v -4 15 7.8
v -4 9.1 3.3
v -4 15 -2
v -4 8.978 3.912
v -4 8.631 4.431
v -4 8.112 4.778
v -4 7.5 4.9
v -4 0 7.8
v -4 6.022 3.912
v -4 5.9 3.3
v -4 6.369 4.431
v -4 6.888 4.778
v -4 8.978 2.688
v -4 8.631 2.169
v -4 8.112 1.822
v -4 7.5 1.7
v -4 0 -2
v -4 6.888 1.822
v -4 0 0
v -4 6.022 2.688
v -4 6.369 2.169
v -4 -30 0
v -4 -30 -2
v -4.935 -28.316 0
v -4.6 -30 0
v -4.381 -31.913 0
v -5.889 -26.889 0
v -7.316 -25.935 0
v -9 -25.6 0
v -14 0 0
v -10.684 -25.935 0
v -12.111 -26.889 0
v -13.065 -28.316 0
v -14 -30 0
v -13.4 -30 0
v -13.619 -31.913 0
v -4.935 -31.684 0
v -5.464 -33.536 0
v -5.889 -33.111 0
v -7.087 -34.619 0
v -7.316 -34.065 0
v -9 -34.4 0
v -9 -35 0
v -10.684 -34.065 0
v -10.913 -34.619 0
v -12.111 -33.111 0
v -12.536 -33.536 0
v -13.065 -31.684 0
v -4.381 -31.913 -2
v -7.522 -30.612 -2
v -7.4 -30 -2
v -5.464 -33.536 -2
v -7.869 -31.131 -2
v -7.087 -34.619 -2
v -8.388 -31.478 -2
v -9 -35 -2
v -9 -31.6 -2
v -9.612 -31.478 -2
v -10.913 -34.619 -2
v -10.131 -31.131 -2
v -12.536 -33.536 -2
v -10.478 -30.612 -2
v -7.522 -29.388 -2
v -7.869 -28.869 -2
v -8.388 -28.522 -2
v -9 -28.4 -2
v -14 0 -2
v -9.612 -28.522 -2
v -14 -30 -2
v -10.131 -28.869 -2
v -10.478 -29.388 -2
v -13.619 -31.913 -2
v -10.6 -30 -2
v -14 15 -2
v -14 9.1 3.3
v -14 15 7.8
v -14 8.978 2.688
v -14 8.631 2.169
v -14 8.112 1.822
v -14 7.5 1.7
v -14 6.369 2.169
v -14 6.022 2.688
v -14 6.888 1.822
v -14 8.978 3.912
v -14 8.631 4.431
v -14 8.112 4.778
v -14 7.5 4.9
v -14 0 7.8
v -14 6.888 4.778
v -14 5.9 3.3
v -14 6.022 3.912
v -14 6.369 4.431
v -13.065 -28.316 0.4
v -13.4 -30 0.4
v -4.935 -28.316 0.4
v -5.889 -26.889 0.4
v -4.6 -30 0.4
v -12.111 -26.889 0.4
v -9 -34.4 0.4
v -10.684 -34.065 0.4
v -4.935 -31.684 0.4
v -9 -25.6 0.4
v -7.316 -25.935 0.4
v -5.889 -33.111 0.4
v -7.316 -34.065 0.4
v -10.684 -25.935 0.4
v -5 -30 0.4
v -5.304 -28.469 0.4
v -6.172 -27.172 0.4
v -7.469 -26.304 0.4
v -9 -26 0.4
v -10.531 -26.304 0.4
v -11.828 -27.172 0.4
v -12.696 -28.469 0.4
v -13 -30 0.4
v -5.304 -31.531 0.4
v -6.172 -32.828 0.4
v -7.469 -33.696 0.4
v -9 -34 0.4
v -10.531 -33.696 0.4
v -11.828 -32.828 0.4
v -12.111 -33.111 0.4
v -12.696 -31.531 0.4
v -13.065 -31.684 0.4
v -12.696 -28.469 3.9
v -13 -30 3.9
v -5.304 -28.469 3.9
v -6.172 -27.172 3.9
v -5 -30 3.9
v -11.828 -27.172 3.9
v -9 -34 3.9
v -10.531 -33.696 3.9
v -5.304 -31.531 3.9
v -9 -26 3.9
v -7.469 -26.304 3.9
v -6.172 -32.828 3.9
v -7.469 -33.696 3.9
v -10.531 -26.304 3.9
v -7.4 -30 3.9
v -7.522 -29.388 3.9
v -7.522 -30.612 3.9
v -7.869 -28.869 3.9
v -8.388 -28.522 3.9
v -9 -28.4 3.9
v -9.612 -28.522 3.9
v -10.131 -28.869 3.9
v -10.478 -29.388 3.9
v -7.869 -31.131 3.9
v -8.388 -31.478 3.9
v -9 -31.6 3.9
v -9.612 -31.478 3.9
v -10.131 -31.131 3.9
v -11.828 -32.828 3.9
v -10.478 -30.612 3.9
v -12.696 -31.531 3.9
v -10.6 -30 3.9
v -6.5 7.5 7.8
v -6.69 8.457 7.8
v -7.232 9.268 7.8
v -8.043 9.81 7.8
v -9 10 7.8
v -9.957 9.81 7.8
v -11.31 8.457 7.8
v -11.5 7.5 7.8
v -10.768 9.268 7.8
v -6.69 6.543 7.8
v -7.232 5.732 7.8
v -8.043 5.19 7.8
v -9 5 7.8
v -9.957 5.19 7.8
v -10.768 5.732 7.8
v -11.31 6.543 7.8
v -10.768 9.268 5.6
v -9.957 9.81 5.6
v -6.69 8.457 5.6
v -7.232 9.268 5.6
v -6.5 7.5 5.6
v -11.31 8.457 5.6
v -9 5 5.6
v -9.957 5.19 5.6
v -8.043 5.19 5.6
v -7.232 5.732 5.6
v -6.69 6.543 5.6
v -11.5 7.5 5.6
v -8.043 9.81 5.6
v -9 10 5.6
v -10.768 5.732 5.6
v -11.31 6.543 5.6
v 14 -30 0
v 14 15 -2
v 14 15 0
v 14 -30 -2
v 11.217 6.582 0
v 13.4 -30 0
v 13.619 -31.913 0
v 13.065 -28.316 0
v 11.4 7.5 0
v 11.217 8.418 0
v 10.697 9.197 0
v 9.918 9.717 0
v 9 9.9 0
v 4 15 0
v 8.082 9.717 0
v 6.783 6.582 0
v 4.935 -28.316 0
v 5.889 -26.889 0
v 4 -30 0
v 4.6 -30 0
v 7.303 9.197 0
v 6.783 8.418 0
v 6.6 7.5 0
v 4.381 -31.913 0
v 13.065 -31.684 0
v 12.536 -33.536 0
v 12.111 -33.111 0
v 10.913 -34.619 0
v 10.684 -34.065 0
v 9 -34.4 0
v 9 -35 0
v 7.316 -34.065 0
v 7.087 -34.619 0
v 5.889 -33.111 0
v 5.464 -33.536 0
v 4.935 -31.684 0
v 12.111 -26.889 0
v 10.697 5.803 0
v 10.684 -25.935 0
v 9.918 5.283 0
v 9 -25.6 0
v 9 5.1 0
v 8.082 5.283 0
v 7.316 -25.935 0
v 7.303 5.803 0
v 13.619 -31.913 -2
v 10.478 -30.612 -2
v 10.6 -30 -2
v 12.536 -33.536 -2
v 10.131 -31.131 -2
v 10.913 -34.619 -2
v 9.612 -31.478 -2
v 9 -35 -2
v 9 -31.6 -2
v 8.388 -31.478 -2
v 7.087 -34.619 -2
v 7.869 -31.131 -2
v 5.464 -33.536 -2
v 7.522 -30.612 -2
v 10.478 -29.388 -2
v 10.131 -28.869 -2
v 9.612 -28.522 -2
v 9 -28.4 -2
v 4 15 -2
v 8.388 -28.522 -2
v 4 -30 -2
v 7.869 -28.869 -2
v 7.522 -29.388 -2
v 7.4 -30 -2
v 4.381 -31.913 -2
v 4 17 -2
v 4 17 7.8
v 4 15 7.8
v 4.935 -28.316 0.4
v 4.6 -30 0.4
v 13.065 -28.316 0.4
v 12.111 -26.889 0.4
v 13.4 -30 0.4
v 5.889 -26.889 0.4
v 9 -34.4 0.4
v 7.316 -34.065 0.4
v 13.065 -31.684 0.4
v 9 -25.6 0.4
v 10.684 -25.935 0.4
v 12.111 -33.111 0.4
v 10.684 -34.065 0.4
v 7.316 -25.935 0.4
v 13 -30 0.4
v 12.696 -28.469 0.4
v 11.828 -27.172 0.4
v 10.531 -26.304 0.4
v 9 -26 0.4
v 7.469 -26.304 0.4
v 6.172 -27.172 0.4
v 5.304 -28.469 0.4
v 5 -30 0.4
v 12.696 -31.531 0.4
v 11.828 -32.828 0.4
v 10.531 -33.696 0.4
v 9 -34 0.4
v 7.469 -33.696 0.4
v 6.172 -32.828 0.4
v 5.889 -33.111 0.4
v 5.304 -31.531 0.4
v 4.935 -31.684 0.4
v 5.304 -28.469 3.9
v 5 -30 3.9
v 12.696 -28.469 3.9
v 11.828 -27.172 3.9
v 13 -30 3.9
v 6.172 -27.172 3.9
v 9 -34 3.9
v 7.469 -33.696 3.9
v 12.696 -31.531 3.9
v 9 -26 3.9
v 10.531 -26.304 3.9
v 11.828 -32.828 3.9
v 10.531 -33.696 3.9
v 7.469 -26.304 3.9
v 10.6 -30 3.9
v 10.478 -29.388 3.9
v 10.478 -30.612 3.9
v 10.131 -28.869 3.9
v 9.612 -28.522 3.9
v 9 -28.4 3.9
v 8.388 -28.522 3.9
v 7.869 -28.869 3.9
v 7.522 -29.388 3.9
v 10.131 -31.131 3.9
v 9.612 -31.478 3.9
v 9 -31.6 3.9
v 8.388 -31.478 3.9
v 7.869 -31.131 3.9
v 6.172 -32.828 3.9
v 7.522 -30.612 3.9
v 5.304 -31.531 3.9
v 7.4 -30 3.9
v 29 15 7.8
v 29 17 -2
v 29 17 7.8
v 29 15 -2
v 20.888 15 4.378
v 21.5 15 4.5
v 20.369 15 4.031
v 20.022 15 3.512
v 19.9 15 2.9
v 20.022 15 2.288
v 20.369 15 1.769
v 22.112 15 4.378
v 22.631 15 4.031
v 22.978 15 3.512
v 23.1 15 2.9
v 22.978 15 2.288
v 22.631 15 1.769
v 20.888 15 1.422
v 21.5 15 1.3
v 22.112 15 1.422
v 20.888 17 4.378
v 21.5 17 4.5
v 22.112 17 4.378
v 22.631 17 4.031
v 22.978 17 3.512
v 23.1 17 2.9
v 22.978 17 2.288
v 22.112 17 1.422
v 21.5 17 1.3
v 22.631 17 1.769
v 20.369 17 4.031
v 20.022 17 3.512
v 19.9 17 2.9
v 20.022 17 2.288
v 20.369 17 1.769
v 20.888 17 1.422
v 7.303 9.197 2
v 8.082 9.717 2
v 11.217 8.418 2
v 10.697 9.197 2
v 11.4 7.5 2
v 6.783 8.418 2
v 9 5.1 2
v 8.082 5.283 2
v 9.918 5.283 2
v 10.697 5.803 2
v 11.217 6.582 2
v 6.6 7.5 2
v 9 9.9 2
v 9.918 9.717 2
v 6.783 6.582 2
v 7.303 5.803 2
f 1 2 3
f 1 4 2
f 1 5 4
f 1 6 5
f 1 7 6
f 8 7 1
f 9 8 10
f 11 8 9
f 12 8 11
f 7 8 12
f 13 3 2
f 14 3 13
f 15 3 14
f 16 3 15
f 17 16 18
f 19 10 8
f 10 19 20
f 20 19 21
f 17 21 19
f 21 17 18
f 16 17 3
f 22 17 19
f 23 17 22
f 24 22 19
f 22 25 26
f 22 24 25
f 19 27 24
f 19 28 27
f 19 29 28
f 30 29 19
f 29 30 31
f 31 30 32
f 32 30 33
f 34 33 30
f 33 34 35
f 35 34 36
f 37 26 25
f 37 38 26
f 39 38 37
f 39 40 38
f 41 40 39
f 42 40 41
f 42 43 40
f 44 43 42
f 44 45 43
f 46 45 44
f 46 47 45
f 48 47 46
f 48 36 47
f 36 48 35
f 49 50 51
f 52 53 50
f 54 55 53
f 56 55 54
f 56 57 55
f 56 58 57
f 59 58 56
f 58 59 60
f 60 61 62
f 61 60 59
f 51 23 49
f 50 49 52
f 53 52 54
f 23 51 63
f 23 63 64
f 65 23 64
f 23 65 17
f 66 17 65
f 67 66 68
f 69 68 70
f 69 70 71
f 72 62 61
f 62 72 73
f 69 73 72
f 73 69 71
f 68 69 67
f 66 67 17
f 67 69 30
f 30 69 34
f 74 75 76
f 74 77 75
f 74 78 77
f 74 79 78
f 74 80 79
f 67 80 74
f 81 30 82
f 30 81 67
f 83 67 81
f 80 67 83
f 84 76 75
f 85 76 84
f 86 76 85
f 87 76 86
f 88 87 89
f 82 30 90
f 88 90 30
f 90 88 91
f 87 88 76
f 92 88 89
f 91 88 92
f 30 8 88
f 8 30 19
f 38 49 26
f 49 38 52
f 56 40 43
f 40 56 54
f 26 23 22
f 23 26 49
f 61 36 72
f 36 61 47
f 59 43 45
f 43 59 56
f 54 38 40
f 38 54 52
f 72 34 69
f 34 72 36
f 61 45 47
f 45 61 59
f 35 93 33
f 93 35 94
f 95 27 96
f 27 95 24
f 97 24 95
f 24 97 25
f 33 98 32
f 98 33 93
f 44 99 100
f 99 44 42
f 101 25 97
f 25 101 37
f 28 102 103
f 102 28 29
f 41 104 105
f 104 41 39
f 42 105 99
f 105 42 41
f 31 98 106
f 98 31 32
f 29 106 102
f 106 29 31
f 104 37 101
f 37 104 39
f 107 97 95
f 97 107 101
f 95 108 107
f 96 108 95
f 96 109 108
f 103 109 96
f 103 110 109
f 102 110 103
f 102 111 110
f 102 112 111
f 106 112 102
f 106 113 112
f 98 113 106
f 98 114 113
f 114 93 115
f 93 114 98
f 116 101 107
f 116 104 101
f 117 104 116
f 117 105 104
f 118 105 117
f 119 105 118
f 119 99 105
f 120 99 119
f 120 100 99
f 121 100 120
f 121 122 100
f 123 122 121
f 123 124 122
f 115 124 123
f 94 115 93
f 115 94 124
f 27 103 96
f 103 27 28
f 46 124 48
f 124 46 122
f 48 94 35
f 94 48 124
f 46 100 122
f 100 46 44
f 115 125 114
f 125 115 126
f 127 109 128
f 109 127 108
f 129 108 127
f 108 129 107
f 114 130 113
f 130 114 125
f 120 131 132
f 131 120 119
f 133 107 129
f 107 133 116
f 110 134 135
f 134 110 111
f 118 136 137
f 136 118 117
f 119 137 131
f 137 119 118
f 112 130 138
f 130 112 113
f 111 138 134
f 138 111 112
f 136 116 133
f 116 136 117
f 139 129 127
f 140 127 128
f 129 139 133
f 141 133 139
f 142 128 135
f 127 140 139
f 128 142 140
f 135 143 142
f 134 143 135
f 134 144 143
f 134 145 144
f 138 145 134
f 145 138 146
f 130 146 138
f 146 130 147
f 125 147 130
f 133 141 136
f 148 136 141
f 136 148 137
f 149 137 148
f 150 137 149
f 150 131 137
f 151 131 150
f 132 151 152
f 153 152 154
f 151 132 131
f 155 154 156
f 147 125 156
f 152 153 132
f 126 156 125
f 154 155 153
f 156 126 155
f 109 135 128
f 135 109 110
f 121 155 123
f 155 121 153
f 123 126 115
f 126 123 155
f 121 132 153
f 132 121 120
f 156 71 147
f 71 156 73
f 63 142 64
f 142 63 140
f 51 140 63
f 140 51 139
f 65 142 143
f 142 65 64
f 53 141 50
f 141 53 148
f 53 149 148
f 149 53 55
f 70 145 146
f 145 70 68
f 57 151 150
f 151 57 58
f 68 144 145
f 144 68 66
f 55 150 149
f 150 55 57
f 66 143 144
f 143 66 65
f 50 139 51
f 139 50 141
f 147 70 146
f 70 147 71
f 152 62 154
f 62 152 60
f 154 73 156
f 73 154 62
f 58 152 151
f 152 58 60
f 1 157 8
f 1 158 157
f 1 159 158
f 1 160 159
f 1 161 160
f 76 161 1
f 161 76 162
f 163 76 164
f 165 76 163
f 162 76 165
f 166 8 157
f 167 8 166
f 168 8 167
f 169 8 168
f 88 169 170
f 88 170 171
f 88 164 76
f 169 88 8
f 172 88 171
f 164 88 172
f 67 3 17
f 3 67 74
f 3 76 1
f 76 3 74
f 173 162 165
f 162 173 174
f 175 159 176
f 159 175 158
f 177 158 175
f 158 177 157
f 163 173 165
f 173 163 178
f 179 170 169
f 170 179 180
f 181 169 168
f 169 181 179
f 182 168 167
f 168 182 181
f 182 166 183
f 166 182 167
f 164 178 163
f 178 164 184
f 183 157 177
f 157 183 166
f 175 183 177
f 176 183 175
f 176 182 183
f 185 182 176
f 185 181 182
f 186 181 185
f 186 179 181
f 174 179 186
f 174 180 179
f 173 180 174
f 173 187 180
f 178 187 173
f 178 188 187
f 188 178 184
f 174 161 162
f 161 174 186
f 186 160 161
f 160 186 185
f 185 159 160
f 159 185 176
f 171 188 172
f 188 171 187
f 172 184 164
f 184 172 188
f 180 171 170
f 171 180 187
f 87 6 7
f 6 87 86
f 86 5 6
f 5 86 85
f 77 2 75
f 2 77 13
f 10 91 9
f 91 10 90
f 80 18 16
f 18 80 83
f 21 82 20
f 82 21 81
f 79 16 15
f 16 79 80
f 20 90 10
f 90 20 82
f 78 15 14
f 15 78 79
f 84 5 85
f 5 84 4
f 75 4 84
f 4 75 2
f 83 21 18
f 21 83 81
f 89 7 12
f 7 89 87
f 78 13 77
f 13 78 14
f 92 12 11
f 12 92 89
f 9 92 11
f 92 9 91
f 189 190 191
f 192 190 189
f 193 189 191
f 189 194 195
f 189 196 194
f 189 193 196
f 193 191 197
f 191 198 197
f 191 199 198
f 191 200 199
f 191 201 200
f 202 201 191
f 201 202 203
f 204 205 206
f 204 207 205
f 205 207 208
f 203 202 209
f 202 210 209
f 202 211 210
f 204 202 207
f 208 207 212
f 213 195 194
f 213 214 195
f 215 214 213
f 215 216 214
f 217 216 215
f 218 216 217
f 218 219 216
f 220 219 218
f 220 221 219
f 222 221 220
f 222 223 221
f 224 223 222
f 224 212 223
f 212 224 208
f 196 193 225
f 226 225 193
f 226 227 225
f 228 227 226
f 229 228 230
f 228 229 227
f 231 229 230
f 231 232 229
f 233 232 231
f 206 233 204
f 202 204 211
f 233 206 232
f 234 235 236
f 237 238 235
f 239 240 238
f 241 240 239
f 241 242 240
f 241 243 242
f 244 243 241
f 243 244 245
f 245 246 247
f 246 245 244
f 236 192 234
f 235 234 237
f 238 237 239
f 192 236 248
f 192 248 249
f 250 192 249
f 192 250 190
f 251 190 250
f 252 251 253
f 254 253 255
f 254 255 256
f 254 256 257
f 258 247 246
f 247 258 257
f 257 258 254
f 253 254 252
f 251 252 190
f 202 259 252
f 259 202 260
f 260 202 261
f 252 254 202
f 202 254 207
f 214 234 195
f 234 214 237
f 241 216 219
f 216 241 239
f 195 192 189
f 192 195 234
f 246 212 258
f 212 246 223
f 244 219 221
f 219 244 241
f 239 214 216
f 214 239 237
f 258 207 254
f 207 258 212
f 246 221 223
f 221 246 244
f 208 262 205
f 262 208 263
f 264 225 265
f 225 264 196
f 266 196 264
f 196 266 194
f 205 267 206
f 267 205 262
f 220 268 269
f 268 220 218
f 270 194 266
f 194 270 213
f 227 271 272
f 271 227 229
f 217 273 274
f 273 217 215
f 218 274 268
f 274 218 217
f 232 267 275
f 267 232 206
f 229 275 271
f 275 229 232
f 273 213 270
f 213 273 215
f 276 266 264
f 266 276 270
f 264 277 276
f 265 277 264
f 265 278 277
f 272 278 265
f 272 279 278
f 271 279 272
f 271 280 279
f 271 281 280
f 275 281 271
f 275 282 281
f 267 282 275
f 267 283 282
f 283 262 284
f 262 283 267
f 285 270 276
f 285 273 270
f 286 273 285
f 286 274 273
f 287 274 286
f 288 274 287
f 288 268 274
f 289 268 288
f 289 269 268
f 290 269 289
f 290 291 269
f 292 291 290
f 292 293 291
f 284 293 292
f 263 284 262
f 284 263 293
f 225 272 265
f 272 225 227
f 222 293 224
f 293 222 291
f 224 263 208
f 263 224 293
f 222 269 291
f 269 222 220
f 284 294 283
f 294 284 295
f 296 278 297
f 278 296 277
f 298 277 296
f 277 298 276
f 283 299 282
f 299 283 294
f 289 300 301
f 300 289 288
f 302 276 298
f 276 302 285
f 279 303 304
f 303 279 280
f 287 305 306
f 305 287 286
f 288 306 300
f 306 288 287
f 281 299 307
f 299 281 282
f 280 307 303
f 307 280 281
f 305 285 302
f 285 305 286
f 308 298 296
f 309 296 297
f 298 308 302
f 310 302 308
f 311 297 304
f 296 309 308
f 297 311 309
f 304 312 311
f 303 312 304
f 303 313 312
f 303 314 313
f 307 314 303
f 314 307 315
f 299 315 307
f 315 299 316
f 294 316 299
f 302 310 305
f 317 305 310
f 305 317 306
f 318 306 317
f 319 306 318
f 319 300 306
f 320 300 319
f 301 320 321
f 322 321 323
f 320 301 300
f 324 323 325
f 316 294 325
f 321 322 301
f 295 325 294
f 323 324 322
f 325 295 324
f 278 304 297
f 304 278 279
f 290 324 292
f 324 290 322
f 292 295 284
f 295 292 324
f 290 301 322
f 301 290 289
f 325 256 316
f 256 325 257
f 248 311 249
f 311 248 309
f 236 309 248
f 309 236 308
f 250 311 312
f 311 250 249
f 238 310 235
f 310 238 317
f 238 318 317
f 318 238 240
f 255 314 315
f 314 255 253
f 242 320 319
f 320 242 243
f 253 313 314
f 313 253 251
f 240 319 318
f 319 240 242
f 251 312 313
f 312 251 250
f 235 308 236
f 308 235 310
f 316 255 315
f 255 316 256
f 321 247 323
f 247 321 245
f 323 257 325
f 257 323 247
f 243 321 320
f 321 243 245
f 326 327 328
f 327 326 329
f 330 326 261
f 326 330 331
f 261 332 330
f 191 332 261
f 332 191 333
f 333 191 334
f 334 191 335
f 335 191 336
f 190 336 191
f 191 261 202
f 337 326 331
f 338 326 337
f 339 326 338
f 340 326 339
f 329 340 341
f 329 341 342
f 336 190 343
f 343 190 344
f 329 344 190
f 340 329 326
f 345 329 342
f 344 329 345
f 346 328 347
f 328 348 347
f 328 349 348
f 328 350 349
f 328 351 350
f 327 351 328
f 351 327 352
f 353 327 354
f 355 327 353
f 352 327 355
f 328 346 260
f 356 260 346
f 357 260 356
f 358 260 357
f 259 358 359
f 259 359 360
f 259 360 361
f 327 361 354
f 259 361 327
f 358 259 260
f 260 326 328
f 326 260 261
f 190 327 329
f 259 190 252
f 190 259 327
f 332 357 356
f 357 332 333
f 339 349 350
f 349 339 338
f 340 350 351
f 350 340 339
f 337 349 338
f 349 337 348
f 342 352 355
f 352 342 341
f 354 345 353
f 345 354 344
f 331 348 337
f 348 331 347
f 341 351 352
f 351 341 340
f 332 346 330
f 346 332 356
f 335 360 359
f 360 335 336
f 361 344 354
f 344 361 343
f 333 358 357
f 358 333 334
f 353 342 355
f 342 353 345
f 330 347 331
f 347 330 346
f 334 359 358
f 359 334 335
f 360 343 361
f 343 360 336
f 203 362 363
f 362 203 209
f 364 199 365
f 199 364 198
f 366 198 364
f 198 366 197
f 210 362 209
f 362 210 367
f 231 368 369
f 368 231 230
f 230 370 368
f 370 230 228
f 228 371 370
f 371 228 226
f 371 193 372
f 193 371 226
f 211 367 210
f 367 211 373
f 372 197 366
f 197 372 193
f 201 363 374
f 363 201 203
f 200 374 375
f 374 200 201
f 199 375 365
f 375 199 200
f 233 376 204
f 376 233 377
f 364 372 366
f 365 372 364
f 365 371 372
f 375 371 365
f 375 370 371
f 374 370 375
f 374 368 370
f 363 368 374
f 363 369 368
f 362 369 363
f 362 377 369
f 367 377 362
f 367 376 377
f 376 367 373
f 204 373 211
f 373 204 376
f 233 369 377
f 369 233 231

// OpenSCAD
$fn = 16;

openbeam_width = 15;
width = 10;
height = 30;
thickness = 2;
axle_dia = 8;
bearing_width = 7;
clip_dia = 5;
clip_height = 2;
screw_dia = 3+0.2;
bearing_spacer_height = 0.4;

module bracket1_bearing_arm() {
	difference() {
		union() {
			translate([0, 0, -thickness/2])
				union() {
					cube([width, height, thickness], center = true);
					translate([0, -height/2, 0])
						cylinder(d = width, h = thickness, center = true);
				}

			translate([0, -height/2, 0]) {
				cylinder(d = axle_dia*1.1, h = bearing_spacer_height);
				translate([0, 0, bearing_spacer_height])
					cylinder(d = axle_dia, h = bearing_width/2);
			}
		}

		// screw hole through clip
		translate([0, -height/2, -thickness - 0.5])
			cylinder(d = screw_dia, h = thickness + bearing_spacer_height + bearing_width/2 + 1);
	}
}

module bracket1_openbeam_socket() {
	difference() {
		cube([width, openbeam_width, bearing_width+thickness+2*bearing_spacer_height],
			center = true);

		// clip
		translate([0, 0, bearing_width/2 + thickness/2 + bearing_spacer_height - clip_height/2])
			cylinder(d = clip_dia, h = clip_height+0.4, center = true);

		// screw hole
		translate([0, 0, bearing_spacer_height])
			rotate([0, 90, 0])
				cylinder(d = screw_dia, h = width + 2, center = true);
	}
}

module bracket1() {
	union() {
		translate([0, -height/2, 0])
			bracket1_bearing_arm();
		translate([0, openbeam_width/2, bearing_width/2-thickness/2+bearing_spacer_height])
			bracket1_openbeam_socket();
	}
}

module bracket2_bearing_arm() {
	difference() {
		union() {
			translate([0, 0, -thickness/2])
				union() {
					cube([width, height, thickness], center = true);
					translate([0, -height/2, 0])
						cylinder(d = width, h = thickness, center = true);
				}

			translate([0, -height/2, 0]) {
				cylinder(d = axle_dia*1.1, h = bearing_spacer_height);
				translate([0, 0, bearing_spacer_height])
					cylinder(d = axle_dia, h = bearing_width/2);
			}
		}

		// screw hole through clip
		translate([0, -height/2, -thickness - 0.5])
			cylinder(d = screw_dia, h = thickness + bearing_spacer_height + bearing_width/2 + 1);
	}
}

module bracket2_openbeam_socket() {
	union() {
		cube([width, openbeam_width, thickness], center = true);
		// clip
		translate([0, 0, thickness/2])
			cylinder(d = clip_dia - 0.2, h = clip_height);

		translate([openbeam_width/2, openbeam_width/2 + thickness/2, bearing_width/2 + bearing_spacer_height])
			rotate([90, 0, 0])
				difference() {
					cube([width + openbeam_width, bearing_width + thickness + bearing_spacer_height*2, thickness], center = true);
					translate([width/2, 0, 0])
						cylinder(d = screw_dia, h = thickness+1, center = true);
				}
	}
}

module bracket2() {
	union() {
		translate([0, -height/2, 0])
			bracket2_bearing_arm();
		translate([0, openbeam_width/2, -thickness/2])
			bracket2_openbeam_socket();
	}
}

translate([-width/2 - 4, 0, 0])
	bracket1();

translate([width/2 + 4, 0, 0])
	bracket2();
